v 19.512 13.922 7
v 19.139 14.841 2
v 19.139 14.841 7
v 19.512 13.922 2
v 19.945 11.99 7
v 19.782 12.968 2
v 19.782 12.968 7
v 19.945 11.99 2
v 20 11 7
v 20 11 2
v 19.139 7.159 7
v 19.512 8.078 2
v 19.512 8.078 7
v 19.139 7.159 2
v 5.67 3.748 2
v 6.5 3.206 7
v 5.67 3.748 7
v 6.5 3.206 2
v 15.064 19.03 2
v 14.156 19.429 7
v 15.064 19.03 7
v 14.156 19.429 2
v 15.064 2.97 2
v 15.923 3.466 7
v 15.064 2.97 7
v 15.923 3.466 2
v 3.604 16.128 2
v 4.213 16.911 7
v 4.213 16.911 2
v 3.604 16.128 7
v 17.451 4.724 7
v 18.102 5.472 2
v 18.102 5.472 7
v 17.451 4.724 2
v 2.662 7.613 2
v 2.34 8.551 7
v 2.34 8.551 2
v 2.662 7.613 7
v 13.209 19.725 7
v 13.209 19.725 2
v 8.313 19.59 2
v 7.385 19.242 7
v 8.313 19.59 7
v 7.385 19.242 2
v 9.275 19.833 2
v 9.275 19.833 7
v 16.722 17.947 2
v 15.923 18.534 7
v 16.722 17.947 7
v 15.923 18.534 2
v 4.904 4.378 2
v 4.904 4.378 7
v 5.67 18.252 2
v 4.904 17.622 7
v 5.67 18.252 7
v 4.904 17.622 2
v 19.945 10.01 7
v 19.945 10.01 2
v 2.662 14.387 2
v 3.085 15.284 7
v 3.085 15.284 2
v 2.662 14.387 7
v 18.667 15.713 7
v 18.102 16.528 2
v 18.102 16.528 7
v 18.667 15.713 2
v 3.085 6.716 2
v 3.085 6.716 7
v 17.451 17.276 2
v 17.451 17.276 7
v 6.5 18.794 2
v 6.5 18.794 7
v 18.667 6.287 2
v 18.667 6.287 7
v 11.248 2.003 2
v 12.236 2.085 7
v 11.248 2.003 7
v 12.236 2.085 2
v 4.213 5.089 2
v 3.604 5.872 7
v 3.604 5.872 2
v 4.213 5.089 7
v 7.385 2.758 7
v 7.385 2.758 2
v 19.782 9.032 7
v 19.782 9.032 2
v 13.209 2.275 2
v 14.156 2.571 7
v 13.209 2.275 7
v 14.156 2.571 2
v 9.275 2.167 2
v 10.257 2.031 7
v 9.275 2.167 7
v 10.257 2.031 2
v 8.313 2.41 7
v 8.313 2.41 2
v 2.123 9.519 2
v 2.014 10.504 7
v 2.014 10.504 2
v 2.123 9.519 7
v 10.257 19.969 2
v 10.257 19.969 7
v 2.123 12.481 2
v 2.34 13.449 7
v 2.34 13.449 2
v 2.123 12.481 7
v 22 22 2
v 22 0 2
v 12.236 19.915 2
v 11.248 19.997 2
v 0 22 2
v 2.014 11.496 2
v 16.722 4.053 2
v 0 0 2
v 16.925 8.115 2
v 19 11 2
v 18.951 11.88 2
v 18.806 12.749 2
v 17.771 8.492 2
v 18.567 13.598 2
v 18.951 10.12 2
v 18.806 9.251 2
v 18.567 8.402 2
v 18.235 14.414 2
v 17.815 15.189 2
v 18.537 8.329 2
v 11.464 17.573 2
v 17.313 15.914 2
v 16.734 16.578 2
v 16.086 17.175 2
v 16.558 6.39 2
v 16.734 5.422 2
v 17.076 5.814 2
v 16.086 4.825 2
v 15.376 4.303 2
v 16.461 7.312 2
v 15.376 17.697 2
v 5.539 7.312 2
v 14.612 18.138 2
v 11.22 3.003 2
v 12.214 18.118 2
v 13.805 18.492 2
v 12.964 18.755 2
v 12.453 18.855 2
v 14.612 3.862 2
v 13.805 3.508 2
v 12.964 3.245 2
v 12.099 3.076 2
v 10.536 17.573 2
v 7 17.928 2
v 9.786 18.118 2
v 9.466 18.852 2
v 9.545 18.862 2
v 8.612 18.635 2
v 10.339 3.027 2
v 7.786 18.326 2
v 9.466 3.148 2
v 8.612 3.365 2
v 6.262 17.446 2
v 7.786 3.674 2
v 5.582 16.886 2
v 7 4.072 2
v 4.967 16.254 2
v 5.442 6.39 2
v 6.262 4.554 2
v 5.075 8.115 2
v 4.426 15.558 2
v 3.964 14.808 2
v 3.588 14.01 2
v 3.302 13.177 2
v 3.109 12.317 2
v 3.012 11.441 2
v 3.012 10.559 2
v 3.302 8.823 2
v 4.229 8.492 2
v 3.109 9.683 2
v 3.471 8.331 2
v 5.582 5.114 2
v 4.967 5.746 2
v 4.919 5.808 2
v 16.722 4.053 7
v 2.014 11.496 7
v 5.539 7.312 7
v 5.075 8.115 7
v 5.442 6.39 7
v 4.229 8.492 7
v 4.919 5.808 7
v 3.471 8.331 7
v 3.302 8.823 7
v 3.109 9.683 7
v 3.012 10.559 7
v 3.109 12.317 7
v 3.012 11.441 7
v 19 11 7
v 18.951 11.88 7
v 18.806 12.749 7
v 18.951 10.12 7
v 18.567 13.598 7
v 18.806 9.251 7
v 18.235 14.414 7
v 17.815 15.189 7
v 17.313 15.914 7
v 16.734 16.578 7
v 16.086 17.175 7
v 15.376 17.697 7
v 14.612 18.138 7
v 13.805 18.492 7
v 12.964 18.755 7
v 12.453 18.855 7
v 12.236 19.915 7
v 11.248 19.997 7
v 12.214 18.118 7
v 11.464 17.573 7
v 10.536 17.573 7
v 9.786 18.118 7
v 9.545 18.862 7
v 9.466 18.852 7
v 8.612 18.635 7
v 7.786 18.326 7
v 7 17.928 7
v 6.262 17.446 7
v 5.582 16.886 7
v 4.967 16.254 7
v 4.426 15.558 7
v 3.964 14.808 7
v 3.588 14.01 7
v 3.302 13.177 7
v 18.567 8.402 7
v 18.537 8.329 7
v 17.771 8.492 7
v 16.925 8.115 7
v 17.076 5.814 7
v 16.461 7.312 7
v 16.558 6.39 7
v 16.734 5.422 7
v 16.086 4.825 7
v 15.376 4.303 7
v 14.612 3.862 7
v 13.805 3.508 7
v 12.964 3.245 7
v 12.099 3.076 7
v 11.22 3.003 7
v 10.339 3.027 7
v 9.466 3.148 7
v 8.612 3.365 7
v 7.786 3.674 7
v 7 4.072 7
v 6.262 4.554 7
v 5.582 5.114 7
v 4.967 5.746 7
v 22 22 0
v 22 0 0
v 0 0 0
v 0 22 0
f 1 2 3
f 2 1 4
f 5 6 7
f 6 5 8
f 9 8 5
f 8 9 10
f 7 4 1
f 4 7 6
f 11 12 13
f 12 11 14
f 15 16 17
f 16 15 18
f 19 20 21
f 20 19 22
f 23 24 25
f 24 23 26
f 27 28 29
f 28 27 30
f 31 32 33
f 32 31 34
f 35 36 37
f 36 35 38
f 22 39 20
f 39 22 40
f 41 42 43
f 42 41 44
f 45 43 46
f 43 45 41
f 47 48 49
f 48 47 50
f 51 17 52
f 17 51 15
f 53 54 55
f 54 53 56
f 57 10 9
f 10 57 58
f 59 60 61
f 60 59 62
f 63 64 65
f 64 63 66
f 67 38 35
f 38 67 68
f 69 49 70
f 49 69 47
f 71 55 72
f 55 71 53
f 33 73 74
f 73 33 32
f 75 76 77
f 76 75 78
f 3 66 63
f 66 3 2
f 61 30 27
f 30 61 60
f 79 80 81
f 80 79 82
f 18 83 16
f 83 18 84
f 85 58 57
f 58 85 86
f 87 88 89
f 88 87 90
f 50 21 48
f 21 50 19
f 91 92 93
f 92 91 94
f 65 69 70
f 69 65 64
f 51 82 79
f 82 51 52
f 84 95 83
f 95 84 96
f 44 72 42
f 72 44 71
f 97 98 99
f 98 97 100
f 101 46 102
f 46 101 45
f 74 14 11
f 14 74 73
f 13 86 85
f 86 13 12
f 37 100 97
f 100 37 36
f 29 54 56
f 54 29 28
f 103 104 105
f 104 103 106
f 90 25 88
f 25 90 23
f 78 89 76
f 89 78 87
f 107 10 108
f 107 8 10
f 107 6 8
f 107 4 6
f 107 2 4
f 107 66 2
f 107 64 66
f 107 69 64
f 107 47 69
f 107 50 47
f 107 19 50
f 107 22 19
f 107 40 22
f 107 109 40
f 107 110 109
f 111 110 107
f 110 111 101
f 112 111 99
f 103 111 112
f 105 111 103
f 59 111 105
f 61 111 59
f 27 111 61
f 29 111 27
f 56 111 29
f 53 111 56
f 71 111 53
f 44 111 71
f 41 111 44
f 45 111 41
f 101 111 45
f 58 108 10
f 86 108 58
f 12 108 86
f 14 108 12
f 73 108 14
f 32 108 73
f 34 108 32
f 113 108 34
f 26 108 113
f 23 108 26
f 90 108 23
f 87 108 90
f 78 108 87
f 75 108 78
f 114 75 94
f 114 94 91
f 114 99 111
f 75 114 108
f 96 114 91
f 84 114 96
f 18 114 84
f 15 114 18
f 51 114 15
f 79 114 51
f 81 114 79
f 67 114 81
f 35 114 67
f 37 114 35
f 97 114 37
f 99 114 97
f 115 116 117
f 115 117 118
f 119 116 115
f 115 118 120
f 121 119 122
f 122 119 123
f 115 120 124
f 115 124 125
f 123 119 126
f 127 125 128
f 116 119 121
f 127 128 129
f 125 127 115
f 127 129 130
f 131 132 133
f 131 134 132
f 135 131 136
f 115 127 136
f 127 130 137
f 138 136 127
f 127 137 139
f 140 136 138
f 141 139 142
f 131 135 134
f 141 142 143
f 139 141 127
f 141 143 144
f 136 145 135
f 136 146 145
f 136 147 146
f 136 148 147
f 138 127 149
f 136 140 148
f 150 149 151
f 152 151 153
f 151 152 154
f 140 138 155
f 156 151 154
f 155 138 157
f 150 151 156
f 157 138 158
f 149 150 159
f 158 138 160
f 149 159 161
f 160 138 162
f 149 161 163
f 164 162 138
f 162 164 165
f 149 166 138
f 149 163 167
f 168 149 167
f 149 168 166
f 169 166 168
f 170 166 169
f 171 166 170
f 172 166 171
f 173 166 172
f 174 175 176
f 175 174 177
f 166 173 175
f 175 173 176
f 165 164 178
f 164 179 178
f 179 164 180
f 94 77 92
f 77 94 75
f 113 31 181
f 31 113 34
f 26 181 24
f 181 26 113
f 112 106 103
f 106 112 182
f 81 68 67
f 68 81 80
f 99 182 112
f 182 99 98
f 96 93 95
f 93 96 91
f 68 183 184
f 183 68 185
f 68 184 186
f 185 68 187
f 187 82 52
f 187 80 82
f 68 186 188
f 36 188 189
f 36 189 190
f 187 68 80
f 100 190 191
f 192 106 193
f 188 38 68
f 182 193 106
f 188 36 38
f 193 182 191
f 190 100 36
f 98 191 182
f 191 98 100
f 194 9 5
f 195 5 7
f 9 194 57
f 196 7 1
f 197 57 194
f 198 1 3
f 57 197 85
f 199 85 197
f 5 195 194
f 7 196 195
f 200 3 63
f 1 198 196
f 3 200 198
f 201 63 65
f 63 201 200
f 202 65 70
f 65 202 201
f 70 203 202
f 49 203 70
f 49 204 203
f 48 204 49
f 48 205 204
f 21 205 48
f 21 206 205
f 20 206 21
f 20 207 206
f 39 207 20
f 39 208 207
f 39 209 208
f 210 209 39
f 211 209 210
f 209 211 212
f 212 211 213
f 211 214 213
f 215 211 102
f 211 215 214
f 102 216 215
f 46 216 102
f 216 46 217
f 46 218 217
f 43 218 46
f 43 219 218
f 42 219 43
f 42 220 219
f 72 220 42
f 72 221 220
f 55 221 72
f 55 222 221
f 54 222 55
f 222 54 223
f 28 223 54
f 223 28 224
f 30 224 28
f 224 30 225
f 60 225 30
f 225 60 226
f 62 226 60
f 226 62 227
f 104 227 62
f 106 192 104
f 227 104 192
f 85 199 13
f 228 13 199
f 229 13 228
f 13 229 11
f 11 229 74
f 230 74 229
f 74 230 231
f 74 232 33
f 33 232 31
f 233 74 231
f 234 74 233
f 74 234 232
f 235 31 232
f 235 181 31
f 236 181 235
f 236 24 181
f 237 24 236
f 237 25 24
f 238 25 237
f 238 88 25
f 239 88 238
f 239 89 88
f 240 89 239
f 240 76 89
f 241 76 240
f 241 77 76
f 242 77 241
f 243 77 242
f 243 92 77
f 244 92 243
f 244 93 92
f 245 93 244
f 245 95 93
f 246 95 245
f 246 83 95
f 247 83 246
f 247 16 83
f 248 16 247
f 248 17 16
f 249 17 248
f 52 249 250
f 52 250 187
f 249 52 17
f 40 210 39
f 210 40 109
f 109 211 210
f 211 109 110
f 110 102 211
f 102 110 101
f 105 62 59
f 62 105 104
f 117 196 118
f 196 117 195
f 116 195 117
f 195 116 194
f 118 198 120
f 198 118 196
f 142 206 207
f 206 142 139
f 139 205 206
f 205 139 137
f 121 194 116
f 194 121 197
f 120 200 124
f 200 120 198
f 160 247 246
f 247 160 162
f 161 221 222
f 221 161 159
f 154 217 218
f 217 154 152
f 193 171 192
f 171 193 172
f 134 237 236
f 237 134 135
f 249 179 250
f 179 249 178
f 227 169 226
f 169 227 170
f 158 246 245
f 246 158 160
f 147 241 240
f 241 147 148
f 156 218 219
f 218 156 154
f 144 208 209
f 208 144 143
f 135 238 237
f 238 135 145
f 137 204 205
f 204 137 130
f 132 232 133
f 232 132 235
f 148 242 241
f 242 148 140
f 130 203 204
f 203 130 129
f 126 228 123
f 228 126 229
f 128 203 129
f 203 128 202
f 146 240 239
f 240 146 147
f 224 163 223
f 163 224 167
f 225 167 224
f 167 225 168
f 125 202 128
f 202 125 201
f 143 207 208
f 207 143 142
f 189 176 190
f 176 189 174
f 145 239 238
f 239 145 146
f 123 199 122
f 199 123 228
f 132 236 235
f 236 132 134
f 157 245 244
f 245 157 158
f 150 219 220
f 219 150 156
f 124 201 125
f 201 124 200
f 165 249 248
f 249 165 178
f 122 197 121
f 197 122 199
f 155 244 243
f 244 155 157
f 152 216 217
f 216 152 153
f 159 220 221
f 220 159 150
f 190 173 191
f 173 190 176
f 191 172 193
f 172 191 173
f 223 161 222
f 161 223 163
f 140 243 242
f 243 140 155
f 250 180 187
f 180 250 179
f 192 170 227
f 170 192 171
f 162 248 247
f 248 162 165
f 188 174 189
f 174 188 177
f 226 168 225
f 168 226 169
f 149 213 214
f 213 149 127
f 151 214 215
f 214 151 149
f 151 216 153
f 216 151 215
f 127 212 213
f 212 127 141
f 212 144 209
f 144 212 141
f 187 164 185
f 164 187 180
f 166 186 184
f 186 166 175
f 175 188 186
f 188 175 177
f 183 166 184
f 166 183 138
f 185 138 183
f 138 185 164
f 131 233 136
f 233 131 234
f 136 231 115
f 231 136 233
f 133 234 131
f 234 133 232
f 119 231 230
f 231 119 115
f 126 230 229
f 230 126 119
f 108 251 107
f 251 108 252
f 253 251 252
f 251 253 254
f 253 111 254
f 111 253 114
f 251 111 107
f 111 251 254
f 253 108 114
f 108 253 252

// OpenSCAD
// file: constants.scad
connectors_notched_circle_thickness = 2;
connectors_notched_circle_notch_diameter = 3;
connectors_notched_circle_loose_length = 1;
connectors_notched_circle_loose_to_tight_length = 1;
// file: ../../utilities/cylinders.scad
// Calculates the $fn which should be used for a cylinder of a specific size.
function cylinder_sides(
  // The diameter of the cylinder.
  diameter
) = ceil(
  max(
    min(
      360 / $fa,
      diameter * PI / $fs
    ),
    8
  )
);

// Generates a grid of square perforations through a cylinder of a specific
// size.
module cylinder_perforations(
  // The diameter of the cylinder.
  diameter,
  // The height of the cylinder.
  length,
  // The size (width/height) of each perforation.
  perforation_size,
  // The target spacing between perforations.  This will be adjusted to fit
  // evenly on the cylinder.
  perforation_spacing
) {
  half_perimeter = diameter * PI / 2;
  angularPerforations = round(half_perimeter / perforation_spacing);
  zPerforations = round(half_perimeter / perforation_spacing);
  for (angle = [0:180 / angularPerforations:180]) {
    rotate([0, 0, angle]) {
      for (z = [perforation_spacing:perforation_spacing:length - perforation_spacing]) {
        translate([0, 0, z]) {
          cube([diameter, perforation_size, perforation_size], center = true);
        };
      }
    };
  };
};

// Generates a "pipe" which lofts a sequence of circles together.
module cylinder_sequence(
  // The diameter of the first circle.
  initial_diameter,
  // An array of arrays, where each child array is two numbers:
  // - The length of the segment along Z.
  // - The diameter of the end of the segment.
  length_diameter_pairs,
  // The number of sides of all circles drawn.
  sides,
  // Used for recursion; leave as default.
  i = 0
) {
  if (i < len(length_diameter_pairs)) {
    cylinder(
      d1 = initial_diameter,
      d2 = length_diameter_pairs[i][1],
      h = length_diameter_pairs[i][0],
      $fn = sides
    );
    translate([
      0,
      0,
      length_diameter_pairs[i][0]
    ]) {
      cylinder_sequence(
        length_diameter_pairs[i][1],
        length_diameter_pairs,
        sides,
        i + 1
      );
    };
  };
};
// file: male.scad
include <../../settings.scad>;
use <../../utilities/cylinders.scad>;
include <constants.scad>;

// Renders the male counterpart of a circular connector with an orienting notch.
// Place on the surface oriented so that Z+ is the surface normal.
module connectors_notched_circle_male(
    // The outer diameter of the male circle.
    diameter,
    // The length of the male circle.
    length,
    // The number of notches, spaced evenly.
    notches
) {
  union() {
    difference() {
      cylinder(
        d = diameter,
        h = length,
        $fn = cylinder_sides(diameter)
      );
      cylinder(
        d = diameter - connectors_notched_circle_thickness,
        h = length,
        $fn = cylinder_sides(diameter)
      );
    };
    intersection() {
      for (notch = [0:notches - 1]) {
        rotate([0, 0, notch * 360 / notches]) {
          translate([
            0,
            diameter / 2 - connectors_notched_circle_thickness / 2,
            0
          ]) {
            cylinder(
              d = connectors_notched_circle_notch_diameter,
              h = length,
              $fn = cylinder_sides(connectors_notched_circle_notch_diameter)
            );
          };
        };
      };
      cylinder(
        d = diameter,
        h = length,
        $fn = cylinder_sides(diameter)
      );
    };
  };
};
// file: ../../settings.scad
// When true, lower resolution primitives will be used.
draft = false;

$fs = draft ? 2 : 1;
$fa = draft ? 12 : 6;

// The amount of space left between parts which must fit together tightly.
tight_tolerance = 0.6;

// The amount of space left between parts which must fit together loosely.
loose_tolerance = 1;
// main file
include <../../settings.scad>;
use <male.scad>;

cube([22, 22, 2]);
translate([11, 11, 2]) {
  connectors_notched_circle_male(18, 5, 3);
};
